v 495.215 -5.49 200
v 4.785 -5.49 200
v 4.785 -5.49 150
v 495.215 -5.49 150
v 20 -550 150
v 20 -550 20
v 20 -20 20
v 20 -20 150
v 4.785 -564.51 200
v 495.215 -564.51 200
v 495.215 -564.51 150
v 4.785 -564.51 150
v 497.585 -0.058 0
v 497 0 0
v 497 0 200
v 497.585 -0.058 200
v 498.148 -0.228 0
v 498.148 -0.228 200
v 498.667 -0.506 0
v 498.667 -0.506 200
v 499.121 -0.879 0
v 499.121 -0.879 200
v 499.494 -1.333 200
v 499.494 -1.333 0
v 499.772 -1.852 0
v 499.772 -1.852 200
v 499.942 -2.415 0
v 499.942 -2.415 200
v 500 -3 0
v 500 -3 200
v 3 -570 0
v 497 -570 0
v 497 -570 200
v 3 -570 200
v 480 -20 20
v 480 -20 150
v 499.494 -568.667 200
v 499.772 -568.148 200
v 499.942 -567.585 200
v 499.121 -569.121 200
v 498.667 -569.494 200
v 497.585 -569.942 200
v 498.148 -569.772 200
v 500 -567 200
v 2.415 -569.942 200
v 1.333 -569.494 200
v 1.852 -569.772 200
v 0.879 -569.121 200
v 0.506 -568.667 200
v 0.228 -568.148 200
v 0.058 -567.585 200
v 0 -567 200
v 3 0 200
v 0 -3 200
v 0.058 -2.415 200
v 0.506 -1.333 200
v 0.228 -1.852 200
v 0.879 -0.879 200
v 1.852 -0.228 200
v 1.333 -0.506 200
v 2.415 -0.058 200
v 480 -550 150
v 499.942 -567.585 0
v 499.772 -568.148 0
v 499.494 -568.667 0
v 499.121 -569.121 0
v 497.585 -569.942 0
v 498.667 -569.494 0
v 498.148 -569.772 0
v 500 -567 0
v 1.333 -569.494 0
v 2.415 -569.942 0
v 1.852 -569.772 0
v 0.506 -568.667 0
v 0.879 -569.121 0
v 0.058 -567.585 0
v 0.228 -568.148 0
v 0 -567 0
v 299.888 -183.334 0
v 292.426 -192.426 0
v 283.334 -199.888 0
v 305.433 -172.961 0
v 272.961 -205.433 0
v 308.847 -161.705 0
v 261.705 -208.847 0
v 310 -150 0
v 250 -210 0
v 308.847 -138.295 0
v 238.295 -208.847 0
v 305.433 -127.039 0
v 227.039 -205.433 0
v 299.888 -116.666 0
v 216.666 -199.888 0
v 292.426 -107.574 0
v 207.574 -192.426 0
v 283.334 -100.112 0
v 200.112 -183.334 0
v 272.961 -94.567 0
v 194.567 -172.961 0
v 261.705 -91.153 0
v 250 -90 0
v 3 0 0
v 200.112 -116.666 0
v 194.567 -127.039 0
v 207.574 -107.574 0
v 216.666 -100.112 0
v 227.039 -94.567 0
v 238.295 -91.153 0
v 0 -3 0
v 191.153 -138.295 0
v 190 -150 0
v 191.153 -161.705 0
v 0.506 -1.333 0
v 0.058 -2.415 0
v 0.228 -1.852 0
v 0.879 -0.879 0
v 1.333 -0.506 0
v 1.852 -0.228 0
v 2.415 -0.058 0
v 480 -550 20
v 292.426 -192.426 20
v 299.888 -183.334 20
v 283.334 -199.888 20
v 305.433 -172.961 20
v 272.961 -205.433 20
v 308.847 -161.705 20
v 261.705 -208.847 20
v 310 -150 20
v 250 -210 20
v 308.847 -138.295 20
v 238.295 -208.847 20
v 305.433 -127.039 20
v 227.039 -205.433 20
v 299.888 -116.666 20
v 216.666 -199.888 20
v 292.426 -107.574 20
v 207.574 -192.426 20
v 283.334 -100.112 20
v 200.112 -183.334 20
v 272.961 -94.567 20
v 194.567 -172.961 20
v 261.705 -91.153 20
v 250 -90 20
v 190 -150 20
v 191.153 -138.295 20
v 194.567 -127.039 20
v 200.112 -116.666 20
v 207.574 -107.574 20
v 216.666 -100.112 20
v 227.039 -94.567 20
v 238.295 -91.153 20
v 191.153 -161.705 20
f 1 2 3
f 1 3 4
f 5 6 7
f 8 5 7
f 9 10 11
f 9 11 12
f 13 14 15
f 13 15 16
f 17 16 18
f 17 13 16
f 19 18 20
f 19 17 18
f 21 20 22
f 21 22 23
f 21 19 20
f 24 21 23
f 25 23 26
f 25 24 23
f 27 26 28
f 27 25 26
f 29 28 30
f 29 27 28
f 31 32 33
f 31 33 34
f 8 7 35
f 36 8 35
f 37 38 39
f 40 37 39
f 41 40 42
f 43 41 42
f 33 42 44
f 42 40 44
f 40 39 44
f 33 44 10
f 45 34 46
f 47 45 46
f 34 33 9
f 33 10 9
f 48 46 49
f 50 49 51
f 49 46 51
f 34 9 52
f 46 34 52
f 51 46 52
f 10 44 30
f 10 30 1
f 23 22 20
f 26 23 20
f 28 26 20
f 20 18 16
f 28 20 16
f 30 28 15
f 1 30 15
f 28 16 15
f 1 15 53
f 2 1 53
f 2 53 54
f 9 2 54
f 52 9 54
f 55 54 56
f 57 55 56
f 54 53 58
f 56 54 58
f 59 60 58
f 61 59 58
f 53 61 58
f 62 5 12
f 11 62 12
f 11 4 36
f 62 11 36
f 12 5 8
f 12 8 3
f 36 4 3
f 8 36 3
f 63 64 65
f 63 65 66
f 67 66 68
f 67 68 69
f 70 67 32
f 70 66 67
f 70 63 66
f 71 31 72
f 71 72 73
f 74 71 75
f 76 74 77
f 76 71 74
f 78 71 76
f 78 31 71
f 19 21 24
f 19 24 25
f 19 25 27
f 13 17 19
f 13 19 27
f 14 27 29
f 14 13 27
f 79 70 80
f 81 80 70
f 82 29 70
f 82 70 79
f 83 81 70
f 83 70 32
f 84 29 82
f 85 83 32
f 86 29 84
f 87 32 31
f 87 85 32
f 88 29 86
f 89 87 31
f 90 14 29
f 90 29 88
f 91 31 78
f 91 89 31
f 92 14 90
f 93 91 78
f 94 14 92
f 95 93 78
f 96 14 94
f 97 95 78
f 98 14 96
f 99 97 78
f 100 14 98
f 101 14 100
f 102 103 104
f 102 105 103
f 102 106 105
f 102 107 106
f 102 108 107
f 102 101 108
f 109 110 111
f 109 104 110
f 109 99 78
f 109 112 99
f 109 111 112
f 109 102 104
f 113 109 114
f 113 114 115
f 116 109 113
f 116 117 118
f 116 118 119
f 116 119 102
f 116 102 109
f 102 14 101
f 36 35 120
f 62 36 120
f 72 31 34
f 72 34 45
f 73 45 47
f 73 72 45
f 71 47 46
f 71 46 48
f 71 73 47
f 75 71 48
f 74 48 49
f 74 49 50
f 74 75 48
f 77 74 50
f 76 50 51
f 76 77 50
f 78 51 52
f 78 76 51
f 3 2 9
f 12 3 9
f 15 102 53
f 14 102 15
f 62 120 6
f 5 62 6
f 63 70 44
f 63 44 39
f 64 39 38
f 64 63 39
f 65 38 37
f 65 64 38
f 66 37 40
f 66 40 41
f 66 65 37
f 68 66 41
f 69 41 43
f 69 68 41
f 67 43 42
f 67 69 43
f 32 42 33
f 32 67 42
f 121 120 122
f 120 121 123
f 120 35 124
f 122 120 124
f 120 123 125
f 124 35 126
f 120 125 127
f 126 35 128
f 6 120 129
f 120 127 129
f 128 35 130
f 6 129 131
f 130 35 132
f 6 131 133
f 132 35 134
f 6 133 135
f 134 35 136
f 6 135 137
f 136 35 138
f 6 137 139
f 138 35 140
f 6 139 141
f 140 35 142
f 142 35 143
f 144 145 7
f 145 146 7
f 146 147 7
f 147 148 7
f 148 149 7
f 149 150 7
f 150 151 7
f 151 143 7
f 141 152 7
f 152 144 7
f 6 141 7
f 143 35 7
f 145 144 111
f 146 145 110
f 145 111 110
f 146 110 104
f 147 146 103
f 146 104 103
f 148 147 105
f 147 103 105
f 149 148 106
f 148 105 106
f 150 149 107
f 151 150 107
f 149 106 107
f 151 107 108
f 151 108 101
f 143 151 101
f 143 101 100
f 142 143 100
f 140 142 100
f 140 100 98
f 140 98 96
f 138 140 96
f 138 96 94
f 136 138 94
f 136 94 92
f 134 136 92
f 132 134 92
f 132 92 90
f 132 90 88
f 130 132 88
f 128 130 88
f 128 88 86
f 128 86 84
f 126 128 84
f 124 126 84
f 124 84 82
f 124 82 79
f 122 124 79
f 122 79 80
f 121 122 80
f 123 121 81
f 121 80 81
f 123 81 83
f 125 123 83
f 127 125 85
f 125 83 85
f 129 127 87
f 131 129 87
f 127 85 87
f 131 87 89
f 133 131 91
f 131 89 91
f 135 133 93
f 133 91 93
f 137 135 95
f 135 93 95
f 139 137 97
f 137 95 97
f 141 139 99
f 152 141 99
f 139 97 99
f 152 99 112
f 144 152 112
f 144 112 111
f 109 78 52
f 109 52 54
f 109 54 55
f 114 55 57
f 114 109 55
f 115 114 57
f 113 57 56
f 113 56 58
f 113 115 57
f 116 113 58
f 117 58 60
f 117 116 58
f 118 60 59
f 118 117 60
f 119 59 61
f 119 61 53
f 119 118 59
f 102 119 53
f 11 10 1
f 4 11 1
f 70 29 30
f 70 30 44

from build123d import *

# Parameters (mm, degrees)
EXTRUDE_1_DEPTH     = 200
SHELL_1_T           = -20
CUT_EXTRUDE_1_DEPTH = 50
SKETCH_3_R          = 60
CUT_EXTRUDE_2_DEPTH = 50


with BuildPart() as part:
    # 草图1 → 凸台-拉伸1 (new body)
    with BuildSketch(Plane.XY):
        with BuildLine():
            Line((3, 0), (497, 0))
            ThreePointArc((497, 0), (499.121320344, -0.878679656), (500, -3))
            Line((500, -3), (500, -567))
            ThreePointArc((500, -567), (499.121320344, -569.121320344), (497, -570))
            Line((497, -570), (3, -570))
            ThreePointArc((3, -570), (0.878679656, -569.121320344), (0, -567))
            Line((0, -567), (0, -3))
            ThreePointArc((0, -3), (0.878679656, -0.878679656), (3, 0))
        make_face()
    extrude(amount=EXTRUDE_1_DEPTH)

    # 抽壳1
    shell_1_openings = [part.faces().sort_by_distance(p)[0] for p in [
        (250, -285, 200),
    ]]
    offset(amount=SHELL_1_T, openings=shell_1_openings, kind=Kind.INTERSECTION)

    # 草图2 → 切除-拉伸1 (cut)
    with BuildSketch(Plane.XY.offset(200)):
        Polygon((4.785, -5.49), (495.215, -5.49), (495.215, -20), (495.215, -550), (495.215, -564.51), (4.785, -564.51), (4.785, -550), (4.785, -20), align=None)
    extrude(amount=-CUT_EXTRUDE_1_DEPTH, mode=Mode.SUBTRACT)

    # 草图3 → 切除-拉伸2 (cut)
    with BuildSketch(Plane(origin=(0, 0, 0), x_dir=(-1, 0, 0), z_dir=(0, 0, -1))):
        with Locations((-250, -150)):
            Circle(SKETCH_3_R)
    extrude(amount=-CUT_EXTRUDE_2_DEPTH, mode=Mode.SUBTRACT)


solid = part.part
